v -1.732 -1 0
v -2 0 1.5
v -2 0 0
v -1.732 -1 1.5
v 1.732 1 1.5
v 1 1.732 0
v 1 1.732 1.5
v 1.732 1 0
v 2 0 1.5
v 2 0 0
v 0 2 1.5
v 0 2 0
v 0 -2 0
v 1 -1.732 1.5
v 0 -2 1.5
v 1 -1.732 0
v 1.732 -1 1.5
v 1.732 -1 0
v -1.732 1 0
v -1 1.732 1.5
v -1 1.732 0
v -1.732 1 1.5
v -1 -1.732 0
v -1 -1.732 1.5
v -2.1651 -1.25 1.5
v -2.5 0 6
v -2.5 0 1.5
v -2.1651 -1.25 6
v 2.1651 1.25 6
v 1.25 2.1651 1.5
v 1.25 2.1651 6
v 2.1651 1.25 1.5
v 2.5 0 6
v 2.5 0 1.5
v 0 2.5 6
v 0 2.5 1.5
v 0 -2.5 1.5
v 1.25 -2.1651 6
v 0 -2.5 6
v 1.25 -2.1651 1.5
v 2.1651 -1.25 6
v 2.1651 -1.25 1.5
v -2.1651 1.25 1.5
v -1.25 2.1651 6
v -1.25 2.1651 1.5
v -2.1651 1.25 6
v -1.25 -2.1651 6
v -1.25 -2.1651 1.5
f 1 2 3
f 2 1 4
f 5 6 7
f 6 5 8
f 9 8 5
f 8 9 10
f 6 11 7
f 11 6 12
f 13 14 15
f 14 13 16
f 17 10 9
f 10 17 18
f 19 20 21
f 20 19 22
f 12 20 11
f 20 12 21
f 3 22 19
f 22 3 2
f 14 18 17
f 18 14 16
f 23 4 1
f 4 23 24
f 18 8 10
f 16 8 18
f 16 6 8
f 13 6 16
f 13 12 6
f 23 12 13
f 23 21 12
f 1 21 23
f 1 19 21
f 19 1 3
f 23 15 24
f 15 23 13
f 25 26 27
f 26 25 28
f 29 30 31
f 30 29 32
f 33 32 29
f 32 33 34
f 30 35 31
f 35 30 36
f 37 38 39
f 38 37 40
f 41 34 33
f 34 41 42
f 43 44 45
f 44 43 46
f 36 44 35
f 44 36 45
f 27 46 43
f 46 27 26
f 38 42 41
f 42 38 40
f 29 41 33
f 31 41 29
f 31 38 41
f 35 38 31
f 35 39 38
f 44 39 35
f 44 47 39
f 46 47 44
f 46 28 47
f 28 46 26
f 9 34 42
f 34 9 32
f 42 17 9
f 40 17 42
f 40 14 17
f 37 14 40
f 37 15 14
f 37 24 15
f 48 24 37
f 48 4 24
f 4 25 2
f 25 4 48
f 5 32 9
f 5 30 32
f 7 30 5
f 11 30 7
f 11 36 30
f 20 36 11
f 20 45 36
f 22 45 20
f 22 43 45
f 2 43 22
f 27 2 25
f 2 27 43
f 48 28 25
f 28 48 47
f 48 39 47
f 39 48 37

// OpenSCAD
// brick round 1x1 wo stud

// external vars #########################

// part ##################################

module brick_round_1x1_wo_stud() {
  $fn = 12;
  union() { cylinder(h=2,d=4); translate([0,0,1.5]) cylinder(h=4.5,d=5); }
}

brick_round_1x1_wo_stud();
